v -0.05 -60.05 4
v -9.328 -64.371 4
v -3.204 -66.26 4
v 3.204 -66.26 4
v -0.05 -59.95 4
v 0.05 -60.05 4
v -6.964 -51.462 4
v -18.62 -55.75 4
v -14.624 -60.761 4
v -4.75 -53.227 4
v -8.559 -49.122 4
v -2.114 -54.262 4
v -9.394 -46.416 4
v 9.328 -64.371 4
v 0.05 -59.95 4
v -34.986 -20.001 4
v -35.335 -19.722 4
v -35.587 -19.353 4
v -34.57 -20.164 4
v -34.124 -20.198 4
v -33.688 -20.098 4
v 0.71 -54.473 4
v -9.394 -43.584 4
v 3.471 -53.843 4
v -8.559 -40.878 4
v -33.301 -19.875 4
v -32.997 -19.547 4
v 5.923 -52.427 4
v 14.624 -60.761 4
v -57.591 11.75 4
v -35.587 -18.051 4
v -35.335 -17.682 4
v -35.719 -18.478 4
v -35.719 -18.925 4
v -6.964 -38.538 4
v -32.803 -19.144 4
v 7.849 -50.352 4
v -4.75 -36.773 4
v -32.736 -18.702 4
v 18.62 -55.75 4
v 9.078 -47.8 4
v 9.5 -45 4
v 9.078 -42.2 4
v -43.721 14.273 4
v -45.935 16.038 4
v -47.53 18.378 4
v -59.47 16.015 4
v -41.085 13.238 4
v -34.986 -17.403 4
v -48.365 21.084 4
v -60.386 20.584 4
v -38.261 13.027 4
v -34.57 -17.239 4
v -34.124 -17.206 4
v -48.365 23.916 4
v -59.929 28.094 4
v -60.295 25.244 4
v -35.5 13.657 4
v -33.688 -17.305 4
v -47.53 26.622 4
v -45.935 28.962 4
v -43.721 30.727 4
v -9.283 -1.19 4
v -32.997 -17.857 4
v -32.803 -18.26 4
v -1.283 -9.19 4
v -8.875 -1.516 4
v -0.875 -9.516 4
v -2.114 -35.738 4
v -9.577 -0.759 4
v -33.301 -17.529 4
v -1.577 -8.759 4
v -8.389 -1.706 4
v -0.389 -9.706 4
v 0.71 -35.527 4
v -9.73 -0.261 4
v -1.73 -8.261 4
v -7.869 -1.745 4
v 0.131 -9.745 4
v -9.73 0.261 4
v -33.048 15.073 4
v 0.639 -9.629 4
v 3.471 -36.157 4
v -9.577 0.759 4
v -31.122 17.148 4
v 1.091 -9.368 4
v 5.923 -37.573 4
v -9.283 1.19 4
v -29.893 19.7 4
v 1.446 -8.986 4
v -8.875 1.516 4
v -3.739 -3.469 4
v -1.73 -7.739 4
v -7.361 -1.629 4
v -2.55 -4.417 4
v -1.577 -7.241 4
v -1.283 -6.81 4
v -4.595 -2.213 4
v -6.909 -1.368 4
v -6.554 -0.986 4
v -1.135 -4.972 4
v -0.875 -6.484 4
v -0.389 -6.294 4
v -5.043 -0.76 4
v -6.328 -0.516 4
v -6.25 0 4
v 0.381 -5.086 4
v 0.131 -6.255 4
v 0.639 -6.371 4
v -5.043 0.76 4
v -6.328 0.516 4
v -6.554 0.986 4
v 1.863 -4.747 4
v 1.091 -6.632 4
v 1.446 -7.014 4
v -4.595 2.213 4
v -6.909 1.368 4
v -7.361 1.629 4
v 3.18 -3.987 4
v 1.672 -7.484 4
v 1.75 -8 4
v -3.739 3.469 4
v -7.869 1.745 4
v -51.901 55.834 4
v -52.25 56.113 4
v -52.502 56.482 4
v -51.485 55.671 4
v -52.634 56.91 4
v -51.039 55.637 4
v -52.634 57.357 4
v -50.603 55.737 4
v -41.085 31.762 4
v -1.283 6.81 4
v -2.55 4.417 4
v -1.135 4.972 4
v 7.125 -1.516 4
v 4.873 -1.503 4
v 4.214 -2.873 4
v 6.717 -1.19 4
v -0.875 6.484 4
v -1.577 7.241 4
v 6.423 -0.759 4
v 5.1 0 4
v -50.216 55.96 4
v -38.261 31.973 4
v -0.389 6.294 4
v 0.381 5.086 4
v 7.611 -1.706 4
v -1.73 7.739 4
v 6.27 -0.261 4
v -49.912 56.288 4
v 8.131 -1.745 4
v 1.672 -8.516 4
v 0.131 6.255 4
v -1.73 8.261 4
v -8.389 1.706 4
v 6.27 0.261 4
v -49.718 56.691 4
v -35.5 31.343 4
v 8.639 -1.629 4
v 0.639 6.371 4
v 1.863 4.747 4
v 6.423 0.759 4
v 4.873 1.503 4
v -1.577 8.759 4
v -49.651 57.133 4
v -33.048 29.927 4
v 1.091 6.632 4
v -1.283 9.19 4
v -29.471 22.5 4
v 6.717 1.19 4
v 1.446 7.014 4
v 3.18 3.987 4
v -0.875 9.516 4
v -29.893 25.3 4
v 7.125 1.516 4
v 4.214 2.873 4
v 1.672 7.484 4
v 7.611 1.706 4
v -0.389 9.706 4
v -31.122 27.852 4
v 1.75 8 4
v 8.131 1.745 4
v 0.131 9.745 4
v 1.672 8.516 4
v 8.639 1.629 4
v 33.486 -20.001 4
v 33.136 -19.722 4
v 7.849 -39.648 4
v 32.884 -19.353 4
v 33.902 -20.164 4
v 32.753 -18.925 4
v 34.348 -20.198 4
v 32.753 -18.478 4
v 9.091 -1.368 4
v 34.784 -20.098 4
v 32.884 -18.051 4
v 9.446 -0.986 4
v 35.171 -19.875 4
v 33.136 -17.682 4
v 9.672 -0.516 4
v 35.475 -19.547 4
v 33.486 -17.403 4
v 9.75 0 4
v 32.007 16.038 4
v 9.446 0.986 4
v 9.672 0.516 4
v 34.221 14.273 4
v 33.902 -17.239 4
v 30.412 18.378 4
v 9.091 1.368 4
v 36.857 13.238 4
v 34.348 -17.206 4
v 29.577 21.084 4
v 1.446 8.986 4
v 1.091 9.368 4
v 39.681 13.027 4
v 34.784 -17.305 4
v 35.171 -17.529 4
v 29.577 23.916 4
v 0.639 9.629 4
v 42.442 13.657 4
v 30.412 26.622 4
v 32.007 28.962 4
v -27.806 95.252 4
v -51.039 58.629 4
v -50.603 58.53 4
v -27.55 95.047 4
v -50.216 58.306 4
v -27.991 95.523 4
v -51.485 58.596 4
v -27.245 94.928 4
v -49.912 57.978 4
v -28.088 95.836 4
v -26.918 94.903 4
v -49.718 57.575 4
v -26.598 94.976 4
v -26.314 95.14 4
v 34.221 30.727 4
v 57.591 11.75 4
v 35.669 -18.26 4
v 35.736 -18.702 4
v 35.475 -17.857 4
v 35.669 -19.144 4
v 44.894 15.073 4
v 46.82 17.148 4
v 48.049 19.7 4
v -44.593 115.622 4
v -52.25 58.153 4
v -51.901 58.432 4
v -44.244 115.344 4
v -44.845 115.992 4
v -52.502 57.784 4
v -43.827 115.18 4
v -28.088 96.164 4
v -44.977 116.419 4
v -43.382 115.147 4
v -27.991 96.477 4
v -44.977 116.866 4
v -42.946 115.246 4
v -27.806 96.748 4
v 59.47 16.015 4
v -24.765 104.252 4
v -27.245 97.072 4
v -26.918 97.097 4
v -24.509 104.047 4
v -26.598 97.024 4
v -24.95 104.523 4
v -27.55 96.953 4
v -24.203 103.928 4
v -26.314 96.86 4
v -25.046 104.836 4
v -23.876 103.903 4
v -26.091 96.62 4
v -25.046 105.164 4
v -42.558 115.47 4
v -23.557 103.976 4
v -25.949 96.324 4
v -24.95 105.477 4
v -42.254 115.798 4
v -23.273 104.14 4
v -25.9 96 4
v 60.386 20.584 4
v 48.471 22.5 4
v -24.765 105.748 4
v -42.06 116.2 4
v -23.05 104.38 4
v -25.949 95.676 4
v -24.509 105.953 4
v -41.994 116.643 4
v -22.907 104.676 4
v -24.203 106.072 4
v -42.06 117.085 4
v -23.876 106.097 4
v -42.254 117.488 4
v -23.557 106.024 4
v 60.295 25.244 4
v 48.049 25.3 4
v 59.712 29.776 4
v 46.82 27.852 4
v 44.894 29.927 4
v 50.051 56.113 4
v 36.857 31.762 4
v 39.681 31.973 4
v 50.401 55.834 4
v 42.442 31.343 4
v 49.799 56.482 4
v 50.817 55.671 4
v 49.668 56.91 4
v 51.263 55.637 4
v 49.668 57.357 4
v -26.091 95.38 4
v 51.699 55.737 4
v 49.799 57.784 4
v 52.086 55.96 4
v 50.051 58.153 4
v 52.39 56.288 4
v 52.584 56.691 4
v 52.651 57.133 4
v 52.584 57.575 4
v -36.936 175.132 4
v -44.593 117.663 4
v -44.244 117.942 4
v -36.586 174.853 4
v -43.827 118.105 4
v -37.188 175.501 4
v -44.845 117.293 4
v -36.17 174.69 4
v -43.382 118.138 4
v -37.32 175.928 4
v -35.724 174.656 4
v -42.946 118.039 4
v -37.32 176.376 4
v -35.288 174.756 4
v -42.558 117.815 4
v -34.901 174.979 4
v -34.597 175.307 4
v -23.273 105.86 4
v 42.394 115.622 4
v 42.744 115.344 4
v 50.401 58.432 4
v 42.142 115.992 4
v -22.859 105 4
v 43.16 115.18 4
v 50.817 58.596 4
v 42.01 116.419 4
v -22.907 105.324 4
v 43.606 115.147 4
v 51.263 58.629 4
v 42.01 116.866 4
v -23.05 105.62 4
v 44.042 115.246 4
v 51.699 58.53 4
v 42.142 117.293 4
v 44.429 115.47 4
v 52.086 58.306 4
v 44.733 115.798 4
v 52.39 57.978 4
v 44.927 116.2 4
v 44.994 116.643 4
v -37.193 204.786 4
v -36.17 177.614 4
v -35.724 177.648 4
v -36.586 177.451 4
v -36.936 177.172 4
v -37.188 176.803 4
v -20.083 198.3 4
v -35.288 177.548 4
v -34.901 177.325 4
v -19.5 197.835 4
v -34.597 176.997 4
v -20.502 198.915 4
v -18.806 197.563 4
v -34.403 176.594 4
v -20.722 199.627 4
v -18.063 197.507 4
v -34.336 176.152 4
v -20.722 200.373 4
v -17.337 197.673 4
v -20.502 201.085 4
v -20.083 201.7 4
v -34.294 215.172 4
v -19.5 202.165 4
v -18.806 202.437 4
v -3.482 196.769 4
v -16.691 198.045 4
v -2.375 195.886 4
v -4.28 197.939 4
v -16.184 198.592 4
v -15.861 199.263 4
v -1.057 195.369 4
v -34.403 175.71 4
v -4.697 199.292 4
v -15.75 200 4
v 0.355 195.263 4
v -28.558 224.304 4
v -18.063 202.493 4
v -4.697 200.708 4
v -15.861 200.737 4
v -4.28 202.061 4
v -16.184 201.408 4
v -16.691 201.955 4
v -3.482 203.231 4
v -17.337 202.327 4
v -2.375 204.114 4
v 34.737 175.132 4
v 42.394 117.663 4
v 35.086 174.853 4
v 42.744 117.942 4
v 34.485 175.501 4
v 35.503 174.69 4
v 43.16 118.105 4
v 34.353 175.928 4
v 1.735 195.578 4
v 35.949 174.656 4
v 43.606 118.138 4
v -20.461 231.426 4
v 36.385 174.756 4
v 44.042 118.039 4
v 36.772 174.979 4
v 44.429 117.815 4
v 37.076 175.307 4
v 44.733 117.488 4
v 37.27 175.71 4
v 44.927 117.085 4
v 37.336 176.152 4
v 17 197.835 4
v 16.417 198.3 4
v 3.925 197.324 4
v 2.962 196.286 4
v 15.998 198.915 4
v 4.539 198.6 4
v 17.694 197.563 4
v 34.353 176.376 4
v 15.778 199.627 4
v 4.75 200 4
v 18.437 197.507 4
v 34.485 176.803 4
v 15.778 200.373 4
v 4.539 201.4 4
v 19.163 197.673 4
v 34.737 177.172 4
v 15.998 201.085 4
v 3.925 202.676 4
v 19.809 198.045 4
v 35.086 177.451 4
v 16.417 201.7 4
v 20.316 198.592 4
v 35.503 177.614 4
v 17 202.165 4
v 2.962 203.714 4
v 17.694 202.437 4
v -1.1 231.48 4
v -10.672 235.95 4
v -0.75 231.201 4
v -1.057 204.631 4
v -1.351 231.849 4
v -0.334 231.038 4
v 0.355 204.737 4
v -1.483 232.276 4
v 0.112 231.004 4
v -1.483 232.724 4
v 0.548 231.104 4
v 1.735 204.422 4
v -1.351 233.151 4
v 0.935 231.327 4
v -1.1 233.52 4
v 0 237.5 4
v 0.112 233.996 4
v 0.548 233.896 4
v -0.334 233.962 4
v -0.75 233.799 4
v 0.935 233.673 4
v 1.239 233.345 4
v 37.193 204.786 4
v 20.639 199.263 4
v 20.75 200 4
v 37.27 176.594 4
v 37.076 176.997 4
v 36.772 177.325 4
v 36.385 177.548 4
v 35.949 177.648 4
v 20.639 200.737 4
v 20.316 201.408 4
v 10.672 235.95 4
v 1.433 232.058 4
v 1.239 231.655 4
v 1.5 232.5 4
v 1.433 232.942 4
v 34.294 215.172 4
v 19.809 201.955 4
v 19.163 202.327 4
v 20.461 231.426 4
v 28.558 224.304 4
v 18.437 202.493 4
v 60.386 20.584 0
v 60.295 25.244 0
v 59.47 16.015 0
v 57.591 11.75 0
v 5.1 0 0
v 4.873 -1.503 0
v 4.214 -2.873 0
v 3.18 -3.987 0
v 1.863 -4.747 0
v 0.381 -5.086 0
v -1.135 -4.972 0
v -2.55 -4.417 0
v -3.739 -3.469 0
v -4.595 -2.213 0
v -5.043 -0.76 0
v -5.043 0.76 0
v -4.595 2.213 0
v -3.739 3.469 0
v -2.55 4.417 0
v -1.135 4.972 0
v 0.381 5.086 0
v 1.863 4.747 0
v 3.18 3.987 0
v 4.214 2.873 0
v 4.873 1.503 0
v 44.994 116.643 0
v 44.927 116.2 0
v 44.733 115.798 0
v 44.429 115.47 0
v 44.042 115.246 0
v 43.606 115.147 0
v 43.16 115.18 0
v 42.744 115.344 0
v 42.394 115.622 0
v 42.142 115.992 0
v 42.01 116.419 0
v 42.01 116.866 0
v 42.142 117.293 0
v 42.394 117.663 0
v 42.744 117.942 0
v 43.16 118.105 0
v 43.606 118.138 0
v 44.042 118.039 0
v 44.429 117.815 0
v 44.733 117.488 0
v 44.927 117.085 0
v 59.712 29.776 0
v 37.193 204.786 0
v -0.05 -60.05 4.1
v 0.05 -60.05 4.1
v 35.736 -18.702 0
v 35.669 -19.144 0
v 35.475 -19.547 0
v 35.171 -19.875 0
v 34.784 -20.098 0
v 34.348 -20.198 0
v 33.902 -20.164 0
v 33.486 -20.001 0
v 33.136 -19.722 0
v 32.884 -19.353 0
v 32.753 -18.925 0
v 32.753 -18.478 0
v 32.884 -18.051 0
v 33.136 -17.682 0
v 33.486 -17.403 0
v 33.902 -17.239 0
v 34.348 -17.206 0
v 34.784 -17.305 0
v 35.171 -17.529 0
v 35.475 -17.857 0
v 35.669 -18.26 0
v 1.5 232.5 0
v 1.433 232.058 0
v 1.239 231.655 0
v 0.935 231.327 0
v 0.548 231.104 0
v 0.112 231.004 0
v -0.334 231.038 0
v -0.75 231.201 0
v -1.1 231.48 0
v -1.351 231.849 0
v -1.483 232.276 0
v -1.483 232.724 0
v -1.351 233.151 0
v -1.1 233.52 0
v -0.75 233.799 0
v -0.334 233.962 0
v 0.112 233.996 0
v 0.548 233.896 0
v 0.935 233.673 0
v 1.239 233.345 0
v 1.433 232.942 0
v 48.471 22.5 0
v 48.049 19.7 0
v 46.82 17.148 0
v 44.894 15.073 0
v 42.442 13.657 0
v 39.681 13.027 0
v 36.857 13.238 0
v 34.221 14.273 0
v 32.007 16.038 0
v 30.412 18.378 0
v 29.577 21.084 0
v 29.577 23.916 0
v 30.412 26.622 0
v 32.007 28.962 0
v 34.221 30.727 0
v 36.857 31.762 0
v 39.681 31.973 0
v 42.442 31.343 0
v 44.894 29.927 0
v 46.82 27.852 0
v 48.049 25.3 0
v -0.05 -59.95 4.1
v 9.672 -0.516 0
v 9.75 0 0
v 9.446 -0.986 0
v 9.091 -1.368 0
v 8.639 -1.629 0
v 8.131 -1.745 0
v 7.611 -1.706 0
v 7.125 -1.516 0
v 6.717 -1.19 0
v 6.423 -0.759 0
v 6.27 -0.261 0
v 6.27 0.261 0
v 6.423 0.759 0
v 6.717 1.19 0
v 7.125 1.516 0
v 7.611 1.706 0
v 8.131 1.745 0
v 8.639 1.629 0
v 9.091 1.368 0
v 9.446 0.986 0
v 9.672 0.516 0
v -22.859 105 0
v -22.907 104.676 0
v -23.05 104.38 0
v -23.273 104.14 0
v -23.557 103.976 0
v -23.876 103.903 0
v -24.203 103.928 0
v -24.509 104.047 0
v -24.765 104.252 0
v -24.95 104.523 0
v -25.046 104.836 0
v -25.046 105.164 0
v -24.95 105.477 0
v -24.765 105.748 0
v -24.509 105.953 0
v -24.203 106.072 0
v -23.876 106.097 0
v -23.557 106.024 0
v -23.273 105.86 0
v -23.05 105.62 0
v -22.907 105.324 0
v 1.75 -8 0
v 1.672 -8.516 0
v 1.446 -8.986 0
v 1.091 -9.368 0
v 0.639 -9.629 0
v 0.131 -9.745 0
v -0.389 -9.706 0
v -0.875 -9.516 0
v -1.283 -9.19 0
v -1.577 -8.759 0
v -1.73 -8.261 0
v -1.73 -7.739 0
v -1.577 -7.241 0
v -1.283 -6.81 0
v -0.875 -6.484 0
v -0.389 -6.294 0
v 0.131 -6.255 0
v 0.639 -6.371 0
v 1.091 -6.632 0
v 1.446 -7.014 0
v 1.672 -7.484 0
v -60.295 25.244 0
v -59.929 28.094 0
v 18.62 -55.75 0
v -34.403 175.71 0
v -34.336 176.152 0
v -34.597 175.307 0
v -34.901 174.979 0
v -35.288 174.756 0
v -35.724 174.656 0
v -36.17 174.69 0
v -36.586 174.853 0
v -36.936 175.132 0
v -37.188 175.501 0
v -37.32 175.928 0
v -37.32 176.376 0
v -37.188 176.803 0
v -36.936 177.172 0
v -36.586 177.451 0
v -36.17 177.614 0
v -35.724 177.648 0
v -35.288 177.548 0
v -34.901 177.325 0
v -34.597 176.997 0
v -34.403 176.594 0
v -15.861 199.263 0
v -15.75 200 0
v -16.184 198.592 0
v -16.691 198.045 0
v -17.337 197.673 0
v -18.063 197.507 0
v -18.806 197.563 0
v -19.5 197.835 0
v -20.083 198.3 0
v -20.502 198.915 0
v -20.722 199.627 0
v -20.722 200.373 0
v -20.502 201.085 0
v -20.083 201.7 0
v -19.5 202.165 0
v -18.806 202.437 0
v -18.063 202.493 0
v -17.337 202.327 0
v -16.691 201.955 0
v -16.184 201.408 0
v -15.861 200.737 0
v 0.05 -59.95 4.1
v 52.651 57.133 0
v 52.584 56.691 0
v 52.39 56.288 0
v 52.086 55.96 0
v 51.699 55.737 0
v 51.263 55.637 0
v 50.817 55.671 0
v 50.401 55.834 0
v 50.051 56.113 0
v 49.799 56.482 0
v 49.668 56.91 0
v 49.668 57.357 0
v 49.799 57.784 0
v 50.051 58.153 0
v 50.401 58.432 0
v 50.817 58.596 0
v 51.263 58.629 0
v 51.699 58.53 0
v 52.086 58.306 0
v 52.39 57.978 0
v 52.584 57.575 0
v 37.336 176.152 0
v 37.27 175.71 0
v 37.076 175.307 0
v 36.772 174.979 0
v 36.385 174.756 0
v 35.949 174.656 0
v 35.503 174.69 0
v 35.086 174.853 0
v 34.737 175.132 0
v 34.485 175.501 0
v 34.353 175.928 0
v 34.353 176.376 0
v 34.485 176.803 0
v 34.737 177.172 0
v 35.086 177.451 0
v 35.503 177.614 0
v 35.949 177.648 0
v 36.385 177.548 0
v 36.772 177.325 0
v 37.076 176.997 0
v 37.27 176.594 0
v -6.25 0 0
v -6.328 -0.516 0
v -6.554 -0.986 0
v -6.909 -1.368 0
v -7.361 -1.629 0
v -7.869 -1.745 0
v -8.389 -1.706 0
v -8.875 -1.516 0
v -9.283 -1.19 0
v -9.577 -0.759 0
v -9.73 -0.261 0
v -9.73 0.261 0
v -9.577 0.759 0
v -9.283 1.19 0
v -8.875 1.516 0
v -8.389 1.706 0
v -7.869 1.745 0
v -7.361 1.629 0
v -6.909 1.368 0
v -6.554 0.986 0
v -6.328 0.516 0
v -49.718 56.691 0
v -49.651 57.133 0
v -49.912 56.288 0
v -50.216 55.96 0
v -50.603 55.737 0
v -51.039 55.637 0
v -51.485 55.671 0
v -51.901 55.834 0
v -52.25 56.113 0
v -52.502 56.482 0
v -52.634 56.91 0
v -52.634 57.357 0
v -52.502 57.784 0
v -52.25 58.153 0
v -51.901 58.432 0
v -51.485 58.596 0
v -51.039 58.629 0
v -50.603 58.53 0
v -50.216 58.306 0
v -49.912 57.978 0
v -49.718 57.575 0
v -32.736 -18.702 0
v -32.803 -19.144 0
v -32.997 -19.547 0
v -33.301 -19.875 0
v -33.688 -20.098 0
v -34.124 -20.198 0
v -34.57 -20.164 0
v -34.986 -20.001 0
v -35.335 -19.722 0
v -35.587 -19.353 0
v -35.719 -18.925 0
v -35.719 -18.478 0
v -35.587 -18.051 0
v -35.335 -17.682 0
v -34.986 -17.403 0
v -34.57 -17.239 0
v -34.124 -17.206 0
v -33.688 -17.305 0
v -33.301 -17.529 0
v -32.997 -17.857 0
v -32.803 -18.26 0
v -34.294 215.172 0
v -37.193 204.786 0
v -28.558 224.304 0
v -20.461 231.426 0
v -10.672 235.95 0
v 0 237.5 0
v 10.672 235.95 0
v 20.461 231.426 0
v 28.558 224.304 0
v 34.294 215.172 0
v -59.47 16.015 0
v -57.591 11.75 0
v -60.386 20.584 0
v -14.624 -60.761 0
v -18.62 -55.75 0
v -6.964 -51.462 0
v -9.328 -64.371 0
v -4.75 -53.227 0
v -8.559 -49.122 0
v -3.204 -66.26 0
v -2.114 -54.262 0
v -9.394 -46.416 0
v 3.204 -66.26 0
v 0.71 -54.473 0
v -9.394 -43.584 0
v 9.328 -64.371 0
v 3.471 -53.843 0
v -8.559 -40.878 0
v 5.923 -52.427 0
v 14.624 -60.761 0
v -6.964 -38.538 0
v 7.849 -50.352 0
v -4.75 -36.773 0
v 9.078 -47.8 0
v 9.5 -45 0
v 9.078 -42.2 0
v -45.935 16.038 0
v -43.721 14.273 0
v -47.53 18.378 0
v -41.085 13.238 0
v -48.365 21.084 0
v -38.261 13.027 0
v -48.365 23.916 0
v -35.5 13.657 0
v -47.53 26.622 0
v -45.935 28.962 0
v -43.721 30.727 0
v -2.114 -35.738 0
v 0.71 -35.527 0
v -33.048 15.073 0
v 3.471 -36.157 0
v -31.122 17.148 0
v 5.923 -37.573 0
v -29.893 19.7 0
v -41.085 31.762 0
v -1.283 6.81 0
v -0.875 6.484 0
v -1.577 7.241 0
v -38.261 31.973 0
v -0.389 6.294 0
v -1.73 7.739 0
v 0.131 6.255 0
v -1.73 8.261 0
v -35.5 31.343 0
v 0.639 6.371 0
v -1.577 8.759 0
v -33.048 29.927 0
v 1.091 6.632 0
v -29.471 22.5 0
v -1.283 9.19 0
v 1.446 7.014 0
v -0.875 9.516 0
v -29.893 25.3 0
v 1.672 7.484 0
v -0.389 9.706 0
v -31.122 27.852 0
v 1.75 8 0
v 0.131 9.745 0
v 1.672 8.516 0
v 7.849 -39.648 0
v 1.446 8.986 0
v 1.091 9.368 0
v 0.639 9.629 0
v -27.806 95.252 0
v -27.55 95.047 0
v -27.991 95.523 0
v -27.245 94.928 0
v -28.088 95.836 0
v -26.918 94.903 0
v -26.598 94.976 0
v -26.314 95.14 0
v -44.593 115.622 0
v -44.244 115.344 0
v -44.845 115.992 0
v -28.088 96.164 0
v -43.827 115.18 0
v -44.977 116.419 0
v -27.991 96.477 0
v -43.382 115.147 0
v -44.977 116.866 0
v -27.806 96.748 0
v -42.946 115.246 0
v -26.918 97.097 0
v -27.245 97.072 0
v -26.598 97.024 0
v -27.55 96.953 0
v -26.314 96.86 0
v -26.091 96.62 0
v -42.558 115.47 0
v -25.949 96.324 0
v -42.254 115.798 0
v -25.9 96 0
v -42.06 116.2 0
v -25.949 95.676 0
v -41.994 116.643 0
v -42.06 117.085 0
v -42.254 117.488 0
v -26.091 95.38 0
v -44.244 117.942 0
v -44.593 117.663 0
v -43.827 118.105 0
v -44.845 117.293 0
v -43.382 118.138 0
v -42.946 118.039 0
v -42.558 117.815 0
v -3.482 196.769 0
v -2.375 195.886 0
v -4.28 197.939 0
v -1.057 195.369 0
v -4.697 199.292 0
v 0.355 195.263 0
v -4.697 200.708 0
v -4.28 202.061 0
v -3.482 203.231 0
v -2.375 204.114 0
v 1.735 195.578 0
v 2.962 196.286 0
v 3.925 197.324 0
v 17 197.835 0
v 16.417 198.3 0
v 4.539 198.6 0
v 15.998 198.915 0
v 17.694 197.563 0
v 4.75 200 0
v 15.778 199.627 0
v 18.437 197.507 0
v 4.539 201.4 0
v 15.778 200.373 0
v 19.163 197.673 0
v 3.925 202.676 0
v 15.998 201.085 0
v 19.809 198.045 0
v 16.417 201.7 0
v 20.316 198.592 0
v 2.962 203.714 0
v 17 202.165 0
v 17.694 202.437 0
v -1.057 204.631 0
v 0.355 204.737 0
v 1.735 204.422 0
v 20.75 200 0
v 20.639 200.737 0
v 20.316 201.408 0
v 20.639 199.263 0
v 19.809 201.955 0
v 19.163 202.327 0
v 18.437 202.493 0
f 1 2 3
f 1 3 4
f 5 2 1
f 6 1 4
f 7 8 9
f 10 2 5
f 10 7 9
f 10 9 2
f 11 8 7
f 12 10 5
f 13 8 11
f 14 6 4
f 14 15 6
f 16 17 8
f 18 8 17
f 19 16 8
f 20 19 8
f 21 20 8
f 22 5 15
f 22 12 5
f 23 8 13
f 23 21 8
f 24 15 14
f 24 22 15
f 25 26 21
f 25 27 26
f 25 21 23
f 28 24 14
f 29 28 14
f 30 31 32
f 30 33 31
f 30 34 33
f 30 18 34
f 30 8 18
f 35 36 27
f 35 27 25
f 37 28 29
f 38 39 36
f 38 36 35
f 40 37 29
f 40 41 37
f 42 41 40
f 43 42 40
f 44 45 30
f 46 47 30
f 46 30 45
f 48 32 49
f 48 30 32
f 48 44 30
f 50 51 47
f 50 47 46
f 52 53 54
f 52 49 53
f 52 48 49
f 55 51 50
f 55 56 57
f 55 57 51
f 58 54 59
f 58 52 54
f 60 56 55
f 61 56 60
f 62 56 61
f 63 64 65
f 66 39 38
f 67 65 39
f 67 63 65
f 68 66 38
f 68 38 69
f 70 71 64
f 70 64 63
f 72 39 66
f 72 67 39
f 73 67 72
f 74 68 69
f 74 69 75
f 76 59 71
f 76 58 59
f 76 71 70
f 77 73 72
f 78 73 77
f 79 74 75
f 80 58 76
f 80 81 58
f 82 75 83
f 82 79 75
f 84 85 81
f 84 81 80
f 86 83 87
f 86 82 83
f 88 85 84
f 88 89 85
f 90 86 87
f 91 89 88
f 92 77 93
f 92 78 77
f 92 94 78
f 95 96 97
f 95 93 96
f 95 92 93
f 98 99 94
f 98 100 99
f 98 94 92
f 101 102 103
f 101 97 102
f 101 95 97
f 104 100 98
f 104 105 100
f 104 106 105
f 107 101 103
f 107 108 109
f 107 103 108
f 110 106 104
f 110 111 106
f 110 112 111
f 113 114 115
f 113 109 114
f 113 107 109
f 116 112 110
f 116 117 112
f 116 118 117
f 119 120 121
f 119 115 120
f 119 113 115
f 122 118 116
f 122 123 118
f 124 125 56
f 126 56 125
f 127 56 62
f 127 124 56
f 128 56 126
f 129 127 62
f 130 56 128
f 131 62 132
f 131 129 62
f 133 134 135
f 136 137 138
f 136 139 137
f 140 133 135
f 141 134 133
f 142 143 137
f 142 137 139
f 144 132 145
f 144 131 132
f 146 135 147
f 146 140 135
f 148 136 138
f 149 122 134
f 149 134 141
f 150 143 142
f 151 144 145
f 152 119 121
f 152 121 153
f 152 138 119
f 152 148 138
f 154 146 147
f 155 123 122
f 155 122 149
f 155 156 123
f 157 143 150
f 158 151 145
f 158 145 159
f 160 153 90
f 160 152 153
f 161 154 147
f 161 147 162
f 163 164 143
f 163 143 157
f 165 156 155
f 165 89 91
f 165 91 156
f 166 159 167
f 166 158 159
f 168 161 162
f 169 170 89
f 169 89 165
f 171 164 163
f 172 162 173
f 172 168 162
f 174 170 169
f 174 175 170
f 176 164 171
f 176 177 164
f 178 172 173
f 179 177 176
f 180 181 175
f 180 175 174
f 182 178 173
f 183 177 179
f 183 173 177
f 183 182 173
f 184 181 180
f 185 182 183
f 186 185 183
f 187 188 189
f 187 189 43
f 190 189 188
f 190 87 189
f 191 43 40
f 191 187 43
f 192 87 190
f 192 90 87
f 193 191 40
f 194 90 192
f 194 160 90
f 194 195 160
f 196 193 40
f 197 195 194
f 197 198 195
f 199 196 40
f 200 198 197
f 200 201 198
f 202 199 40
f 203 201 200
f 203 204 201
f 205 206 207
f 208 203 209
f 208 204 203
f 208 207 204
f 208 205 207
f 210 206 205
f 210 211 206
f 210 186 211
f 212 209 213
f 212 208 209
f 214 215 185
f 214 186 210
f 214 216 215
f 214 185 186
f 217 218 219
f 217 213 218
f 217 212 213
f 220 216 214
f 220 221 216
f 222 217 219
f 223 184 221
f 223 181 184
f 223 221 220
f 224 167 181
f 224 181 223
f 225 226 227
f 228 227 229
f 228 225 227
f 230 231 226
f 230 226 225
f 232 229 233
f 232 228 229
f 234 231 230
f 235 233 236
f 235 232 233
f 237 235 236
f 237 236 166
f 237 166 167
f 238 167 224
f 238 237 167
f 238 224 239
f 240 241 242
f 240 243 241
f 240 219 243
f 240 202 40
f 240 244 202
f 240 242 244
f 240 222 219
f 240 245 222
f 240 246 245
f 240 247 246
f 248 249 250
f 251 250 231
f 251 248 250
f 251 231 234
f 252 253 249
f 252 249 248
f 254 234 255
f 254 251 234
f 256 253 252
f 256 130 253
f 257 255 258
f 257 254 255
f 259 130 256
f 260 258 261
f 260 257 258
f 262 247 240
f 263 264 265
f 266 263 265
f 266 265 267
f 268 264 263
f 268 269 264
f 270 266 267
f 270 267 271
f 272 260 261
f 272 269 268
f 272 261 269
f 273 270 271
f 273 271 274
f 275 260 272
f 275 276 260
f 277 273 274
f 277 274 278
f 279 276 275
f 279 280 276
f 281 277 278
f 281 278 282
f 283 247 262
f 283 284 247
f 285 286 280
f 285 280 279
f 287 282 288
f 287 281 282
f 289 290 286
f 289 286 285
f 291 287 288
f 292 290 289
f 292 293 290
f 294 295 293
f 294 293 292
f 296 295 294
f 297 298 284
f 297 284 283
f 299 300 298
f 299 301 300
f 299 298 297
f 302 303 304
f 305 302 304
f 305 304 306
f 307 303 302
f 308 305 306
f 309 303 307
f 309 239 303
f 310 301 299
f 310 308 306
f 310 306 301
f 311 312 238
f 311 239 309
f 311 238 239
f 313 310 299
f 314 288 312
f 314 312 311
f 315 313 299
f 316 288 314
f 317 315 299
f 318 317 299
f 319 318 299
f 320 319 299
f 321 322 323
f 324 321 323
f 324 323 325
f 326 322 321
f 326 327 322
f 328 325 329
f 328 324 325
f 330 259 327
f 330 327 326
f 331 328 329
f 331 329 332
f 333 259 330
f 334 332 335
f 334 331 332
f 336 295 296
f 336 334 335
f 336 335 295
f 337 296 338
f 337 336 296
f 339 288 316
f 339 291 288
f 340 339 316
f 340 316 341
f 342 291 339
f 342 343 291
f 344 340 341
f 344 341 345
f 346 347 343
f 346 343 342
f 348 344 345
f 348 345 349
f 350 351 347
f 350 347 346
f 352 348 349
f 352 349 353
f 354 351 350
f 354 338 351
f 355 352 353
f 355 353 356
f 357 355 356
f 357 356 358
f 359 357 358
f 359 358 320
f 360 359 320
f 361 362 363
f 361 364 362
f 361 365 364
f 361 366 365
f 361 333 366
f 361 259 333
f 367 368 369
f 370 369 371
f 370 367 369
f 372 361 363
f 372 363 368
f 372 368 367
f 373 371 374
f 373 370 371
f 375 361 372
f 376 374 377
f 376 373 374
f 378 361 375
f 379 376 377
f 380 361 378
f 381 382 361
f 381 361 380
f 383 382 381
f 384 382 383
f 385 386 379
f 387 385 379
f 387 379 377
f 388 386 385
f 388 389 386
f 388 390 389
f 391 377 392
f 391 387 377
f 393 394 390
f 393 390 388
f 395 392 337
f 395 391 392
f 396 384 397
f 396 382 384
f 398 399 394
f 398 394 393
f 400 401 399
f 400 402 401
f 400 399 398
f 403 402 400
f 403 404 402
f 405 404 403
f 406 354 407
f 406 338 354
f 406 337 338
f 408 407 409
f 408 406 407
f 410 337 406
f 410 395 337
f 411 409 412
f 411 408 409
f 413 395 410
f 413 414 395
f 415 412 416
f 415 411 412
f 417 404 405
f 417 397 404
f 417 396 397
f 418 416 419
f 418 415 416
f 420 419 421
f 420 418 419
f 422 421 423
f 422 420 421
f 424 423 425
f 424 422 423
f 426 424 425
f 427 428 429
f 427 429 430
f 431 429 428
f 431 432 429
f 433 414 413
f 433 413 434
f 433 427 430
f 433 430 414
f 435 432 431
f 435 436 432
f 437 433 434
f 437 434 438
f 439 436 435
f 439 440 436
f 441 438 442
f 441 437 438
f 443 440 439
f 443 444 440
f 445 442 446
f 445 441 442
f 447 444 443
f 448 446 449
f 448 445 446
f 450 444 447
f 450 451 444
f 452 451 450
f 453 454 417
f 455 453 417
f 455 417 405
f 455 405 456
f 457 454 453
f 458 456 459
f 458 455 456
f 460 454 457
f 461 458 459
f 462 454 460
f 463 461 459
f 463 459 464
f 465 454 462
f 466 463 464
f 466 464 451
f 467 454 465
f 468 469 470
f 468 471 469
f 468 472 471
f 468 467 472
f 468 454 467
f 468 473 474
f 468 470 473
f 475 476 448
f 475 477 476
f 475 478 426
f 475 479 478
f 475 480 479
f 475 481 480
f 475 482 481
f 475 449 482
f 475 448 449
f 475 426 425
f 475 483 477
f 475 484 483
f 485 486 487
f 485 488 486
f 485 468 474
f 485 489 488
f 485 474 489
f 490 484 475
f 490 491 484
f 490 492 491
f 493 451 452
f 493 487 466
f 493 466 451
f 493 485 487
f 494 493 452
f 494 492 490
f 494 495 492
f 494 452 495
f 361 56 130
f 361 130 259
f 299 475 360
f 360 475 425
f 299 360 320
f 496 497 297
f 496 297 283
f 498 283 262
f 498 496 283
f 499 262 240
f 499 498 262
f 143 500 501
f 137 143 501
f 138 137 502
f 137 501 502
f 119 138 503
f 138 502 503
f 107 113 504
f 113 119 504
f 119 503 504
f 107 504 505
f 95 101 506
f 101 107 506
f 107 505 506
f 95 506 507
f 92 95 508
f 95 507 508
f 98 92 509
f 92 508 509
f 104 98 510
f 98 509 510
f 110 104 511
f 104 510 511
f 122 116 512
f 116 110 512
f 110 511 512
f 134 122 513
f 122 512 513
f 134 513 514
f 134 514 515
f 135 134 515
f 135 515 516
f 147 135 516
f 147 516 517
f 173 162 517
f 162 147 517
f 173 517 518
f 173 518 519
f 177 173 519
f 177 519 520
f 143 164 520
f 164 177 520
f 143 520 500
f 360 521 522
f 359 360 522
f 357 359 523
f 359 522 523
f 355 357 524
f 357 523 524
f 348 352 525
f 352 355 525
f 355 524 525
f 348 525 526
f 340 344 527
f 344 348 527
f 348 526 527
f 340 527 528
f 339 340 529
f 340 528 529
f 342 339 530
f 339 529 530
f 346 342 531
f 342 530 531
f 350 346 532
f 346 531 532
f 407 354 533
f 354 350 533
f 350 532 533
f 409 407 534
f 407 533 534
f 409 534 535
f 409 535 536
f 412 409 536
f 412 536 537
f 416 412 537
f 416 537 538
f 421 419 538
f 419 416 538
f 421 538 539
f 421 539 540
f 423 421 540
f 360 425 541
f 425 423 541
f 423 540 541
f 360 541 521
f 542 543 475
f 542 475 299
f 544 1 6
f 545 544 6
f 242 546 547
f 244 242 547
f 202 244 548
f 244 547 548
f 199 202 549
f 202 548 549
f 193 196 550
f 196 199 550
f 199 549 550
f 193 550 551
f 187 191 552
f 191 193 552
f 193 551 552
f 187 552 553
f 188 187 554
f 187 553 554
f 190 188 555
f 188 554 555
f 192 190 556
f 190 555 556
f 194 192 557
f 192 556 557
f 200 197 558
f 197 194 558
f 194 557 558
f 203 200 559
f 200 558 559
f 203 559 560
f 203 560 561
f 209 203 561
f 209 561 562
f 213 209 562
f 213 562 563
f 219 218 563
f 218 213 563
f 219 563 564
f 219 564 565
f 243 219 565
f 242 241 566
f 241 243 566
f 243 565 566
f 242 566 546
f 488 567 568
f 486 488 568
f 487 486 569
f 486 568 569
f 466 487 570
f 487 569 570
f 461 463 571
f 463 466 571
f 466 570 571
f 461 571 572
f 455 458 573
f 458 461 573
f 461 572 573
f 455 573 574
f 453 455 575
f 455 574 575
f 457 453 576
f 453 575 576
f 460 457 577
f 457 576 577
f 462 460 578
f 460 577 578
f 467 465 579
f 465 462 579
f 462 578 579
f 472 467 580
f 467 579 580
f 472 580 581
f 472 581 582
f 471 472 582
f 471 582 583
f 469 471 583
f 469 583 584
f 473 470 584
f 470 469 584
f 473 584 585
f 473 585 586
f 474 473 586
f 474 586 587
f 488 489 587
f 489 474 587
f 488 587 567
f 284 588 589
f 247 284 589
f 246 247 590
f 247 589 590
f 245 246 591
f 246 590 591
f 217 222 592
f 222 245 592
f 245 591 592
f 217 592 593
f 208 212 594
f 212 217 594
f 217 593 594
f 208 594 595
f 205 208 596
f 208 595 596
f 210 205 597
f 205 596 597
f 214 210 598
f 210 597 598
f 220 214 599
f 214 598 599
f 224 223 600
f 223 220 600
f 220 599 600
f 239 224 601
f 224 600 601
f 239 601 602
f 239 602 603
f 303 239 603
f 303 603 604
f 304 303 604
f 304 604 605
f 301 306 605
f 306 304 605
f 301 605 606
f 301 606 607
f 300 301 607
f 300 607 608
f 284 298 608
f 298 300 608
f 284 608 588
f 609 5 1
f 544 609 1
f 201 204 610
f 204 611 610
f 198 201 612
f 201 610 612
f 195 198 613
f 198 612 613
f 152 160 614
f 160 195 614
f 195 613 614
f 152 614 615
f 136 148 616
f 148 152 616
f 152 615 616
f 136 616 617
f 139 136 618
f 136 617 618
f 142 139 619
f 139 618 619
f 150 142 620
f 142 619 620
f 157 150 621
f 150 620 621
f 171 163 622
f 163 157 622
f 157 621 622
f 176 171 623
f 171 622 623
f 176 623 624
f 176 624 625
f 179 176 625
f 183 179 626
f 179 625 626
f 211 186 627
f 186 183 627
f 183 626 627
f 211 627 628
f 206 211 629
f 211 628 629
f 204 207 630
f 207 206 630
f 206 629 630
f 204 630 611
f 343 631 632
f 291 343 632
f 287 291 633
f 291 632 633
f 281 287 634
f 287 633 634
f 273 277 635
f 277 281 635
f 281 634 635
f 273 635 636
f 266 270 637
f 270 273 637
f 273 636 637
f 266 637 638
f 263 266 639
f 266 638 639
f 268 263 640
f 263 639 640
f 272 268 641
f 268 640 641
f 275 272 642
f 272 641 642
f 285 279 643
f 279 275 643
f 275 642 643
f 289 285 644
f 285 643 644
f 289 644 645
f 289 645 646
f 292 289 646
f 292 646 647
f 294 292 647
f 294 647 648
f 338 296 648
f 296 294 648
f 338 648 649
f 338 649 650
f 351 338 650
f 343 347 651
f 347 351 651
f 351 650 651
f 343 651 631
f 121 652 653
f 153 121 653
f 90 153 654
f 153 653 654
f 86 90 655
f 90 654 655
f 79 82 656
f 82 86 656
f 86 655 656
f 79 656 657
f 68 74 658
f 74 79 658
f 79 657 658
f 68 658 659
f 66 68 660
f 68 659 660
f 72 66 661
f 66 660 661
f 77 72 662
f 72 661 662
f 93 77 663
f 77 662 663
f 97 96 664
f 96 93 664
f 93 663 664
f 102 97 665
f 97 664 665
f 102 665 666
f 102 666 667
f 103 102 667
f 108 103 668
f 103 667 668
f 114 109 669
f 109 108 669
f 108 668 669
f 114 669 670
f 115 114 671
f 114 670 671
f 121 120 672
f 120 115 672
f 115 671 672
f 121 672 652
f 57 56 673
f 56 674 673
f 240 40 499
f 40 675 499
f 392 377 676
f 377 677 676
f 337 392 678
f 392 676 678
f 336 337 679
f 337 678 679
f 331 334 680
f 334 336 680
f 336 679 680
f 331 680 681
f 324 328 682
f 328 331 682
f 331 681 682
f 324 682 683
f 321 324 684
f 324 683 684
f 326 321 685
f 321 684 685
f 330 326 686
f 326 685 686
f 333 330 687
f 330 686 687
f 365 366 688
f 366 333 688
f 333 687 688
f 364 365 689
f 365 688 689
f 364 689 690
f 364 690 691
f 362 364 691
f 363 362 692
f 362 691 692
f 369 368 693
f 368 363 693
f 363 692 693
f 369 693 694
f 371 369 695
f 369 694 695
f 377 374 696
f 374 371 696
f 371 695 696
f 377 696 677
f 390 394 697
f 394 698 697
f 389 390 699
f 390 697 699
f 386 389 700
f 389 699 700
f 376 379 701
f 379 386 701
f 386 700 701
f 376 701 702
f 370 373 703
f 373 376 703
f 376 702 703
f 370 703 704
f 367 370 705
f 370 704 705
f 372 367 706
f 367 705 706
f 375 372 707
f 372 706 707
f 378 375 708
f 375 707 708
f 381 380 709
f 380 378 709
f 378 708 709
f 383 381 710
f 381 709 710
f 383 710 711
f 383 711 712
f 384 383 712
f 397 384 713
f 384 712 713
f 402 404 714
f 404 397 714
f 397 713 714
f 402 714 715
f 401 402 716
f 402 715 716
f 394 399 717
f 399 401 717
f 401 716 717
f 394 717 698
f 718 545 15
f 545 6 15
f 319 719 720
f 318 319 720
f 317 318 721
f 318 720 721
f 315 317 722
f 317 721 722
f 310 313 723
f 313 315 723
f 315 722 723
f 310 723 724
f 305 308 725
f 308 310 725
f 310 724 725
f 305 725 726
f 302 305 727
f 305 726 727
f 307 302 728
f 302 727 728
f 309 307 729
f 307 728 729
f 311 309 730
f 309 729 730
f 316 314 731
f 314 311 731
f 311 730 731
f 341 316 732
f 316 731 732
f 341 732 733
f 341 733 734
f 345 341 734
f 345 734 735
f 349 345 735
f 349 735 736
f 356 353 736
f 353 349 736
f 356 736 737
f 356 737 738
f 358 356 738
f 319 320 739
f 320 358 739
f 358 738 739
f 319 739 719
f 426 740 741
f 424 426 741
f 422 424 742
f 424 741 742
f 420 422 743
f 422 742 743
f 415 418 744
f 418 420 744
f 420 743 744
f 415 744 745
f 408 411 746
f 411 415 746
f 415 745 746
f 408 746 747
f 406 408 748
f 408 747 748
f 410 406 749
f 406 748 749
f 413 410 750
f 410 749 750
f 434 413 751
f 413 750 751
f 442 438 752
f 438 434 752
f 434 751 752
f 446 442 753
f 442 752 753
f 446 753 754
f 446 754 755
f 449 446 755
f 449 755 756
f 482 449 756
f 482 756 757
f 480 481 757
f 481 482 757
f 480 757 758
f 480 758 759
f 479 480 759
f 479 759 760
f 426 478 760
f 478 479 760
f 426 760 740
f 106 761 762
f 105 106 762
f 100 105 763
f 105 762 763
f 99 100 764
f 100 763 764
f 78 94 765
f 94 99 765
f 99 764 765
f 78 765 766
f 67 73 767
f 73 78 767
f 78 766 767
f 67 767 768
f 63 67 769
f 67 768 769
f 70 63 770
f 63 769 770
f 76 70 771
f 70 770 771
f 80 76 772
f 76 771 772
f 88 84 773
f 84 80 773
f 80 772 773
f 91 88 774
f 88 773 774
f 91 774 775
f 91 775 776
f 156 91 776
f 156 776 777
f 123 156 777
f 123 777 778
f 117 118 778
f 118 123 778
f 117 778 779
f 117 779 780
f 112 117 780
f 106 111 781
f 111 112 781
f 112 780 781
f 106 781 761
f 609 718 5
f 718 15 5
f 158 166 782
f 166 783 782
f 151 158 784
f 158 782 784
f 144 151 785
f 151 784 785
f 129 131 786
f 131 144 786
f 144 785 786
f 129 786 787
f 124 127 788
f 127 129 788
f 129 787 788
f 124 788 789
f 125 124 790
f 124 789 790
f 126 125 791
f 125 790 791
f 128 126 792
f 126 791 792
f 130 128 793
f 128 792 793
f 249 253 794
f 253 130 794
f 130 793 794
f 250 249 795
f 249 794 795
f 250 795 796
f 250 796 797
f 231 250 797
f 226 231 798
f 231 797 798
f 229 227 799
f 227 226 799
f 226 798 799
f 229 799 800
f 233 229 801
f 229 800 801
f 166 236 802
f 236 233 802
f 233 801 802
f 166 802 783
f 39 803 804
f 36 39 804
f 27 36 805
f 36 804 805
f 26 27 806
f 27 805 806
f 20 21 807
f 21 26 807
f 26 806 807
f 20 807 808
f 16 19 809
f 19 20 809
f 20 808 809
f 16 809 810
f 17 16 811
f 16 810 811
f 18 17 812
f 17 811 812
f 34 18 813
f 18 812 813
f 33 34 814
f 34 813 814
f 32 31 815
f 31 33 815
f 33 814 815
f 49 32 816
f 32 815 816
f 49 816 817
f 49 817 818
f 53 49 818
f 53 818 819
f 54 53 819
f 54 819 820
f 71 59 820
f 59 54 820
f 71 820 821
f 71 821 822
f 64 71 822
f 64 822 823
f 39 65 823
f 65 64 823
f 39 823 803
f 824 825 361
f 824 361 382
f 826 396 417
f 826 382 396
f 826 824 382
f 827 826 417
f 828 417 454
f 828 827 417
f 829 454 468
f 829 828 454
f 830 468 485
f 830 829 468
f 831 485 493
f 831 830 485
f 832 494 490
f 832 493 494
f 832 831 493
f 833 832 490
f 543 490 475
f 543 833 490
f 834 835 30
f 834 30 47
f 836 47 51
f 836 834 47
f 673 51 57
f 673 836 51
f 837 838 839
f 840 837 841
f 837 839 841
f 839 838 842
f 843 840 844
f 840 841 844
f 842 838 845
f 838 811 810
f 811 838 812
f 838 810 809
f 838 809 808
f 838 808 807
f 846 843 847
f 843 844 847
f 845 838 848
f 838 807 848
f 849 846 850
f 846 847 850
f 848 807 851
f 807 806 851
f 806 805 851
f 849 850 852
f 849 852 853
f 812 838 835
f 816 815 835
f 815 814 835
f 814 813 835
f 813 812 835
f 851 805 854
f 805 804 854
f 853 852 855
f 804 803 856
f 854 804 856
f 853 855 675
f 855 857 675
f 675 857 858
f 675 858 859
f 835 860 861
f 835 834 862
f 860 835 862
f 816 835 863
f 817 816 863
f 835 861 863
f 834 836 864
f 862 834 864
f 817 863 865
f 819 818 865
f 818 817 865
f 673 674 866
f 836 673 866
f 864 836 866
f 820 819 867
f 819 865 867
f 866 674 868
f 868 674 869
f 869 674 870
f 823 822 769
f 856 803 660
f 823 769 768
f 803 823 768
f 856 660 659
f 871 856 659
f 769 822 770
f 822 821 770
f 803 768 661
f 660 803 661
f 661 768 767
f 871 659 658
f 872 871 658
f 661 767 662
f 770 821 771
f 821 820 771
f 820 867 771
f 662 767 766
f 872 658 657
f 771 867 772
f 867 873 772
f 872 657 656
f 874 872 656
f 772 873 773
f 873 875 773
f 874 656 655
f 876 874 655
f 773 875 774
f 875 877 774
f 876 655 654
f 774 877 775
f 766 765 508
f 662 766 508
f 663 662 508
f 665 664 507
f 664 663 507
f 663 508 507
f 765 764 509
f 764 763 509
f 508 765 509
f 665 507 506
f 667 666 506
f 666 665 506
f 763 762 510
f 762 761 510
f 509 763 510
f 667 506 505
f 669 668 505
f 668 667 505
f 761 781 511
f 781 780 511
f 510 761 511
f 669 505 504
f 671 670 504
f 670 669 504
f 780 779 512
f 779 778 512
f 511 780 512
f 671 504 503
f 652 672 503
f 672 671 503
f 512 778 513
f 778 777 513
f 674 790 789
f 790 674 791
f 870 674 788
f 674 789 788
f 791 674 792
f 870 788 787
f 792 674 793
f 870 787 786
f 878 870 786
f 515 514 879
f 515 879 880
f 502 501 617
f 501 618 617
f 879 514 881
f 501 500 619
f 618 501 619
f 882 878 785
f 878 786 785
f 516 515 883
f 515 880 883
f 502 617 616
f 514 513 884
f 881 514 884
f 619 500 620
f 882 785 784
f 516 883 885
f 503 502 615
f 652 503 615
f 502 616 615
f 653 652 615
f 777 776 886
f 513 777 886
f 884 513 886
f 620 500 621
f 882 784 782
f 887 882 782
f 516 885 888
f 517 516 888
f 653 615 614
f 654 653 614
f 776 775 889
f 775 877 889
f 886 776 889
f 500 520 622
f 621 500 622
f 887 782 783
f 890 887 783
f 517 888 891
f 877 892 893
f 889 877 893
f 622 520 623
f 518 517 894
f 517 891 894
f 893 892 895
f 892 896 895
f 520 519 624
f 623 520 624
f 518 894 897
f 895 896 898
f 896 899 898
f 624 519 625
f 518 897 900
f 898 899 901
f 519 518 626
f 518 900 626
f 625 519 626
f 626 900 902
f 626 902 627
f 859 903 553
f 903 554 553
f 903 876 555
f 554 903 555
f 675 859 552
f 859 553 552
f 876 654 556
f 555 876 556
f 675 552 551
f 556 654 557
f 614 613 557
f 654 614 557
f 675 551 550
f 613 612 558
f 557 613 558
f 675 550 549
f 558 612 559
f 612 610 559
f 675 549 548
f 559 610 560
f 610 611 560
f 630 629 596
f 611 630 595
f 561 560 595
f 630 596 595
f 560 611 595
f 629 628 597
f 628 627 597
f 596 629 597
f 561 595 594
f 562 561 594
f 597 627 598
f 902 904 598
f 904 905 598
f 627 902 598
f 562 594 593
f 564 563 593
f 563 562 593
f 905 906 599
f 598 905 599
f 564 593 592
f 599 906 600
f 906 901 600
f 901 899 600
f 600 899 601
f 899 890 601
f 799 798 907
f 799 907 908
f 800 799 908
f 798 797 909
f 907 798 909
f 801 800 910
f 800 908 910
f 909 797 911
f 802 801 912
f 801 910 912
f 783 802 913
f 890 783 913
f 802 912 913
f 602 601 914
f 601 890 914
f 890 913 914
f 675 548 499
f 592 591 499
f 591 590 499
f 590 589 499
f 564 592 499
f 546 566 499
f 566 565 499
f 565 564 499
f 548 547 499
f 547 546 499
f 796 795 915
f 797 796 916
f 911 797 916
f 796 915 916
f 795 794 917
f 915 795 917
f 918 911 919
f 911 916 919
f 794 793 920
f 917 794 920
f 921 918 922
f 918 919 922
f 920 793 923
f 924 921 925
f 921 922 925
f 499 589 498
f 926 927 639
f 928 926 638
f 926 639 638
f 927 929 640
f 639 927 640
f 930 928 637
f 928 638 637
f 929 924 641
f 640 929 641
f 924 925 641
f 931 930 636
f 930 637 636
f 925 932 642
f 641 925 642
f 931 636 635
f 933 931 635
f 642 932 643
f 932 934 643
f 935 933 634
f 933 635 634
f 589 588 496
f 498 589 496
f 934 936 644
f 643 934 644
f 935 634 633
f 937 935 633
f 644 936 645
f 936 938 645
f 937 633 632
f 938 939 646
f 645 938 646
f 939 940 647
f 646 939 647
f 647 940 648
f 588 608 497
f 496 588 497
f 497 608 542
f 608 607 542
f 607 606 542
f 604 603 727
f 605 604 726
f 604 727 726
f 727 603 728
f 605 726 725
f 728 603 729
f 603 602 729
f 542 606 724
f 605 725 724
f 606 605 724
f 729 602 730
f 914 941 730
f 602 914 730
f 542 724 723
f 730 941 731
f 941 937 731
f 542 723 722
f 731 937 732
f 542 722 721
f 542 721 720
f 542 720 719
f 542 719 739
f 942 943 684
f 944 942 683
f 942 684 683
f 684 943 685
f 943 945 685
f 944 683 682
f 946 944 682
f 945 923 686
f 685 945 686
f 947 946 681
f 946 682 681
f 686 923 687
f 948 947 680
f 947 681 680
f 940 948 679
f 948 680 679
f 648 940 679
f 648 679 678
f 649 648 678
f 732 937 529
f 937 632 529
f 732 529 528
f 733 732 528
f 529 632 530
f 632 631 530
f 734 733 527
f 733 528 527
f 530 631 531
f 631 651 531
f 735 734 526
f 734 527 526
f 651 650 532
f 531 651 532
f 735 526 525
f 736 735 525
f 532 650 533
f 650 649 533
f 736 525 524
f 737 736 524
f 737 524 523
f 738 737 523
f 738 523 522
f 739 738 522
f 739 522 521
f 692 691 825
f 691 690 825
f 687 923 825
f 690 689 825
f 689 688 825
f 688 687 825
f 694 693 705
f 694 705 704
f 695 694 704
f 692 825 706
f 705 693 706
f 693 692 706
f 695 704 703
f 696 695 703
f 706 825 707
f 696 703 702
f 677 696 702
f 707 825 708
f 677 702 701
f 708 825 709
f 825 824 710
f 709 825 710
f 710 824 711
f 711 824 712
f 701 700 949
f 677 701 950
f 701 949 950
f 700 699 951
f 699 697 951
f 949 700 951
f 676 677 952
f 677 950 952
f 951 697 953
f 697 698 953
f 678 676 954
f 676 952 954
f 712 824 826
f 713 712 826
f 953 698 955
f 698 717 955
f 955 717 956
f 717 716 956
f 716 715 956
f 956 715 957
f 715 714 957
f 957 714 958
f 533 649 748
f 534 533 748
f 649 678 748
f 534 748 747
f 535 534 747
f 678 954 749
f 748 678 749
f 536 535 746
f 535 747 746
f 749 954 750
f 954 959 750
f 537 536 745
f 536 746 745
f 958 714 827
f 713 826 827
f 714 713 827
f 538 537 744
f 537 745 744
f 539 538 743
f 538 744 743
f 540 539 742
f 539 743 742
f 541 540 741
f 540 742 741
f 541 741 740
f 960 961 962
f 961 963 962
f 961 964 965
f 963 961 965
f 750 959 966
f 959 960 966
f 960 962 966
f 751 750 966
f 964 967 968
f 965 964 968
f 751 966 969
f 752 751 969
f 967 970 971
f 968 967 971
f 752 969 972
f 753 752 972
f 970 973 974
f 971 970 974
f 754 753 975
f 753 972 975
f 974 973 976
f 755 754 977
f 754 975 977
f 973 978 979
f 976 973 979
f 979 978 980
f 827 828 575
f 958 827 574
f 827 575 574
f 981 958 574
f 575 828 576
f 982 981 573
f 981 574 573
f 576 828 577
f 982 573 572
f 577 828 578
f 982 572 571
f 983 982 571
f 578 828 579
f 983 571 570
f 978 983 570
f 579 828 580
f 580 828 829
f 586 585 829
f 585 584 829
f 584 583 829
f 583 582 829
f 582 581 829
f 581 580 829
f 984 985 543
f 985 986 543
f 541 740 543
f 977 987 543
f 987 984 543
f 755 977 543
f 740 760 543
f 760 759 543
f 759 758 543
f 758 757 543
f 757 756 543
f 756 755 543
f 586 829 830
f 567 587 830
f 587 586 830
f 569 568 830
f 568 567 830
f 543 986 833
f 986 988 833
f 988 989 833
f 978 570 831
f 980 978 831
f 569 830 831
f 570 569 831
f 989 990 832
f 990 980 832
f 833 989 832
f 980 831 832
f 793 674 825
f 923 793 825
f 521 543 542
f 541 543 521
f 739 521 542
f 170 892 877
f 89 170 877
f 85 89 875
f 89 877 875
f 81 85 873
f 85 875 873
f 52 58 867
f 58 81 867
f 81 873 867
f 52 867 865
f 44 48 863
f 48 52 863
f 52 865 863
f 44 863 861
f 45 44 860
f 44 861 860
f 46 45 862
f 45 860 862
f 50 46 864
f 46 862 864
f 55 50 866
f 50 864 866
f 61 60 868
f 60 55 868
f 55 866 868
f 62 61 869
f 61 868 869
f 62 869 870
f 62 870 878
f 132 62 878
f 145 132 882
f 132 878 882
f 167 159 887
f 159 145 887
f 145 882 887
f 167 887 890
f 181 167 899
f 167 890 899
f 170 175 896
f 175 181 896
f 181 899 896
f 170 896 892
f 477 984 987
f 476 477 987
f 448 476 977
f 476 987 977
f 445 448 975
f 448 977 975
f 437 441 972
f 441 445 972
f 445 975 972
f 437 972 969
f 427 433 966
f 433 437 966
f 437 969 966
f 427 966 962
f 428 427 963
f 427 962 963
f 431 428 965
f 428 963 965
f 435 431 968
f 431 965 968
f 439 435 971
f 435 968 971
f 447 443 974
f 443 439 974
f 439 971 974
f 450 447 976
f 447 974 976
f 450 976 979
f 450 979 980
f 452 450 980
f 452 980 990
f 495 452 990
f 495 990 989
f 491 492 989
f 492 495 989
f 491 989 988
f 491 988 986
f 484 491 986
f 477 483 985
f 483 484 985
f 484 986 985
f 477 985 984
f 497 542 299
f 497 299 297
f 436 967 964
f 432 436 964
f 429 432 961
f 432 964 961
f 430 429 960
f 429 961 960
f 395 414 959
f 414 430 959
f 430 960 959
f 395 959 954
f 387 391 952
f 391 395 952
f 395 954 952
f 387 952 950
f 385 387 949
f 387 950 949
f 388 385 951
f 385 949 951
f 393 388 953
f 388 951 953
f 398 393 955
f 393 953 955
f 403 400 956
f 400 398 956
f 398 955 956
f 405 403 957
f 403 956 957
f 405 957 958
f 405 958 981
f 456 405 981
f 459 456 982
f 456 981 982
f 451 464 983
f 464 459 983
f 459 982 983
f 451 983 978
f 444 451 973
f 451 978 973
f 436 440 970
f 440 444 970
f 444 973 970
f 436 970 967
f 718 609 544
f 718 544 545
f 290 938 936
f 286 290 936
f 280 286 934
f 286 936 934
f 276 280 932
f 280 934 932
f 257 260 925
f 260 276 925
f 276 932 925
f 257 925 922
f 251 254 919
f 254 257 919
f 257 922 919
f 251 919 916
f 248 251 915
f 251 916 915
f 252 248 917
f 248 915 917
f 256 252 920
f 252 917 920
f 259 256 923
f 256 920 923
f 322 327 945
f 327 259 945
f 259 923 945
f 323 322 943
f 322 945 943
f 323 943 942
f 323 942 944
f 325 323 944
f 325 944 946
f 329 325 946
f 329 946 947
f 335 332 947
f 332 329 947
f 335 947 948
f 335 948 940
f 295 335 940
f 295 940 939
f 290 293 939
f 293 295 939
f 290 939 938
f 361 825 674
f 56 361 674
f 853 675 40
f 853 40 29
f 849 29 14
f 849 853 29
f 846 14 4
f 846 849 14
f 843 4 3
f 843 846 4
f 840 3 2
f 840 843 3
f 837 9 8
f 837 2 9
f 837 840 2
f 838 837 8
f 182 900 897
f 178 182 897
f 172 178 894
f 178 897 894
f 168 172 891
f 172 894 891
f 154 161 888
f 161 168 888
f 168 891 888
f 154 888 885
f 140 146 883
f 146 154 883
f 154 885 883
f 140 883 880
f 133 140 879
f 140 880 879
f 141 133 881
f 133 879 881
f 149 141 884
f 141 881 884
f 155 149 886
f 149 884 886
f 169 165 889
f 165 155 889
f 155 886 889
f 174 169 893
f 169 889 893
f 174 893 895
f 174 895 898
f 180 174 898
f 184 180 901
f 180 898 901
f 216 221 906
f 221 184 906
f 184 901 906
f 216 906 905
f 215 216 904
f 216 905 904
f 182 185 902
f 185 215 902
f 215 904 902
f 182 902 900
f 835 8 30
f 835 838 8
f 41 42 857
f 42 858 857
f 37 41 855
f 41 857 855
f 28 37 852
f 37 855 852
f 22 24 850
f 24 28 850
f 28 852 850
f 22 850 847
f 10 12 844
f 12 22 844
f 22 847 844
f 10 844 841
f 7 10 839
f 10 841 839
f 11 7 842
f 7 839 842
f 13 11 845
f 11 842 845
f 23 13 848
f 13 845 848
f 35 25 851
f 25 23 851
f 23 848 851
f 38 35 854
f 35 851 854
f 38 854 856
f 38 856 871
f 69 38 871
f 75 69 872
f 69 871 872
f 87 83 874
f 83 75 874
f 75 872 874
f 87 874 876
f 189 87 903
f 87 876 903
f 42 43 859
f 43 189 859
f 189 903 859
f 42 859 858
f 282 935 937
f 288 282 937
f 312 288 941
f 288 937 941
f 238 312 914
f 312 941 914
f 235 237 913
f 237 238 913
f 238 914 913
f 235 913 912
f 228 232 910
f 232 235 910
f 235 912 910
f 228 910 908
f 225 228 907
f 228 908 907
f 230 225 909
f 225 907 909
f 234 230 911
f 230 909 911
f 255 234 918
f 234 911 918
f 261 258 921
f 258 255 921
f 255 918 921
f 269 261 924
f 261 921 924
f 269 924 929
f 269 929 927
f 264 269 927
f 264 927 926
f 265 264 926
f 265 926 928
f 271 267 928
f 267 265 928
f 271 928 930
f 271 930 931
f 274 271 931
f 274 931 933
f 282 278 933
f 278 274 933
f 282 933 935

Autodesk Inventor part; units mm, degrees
ref_plane "YZ Plane" through (0, 0, 0) normal (1, 0, 0) x (0, 1, 0)
ref_plane "XZ Plane" through (0, 0, 0) normal (0, 1, 0) x (-1, 0, 0)
ref_plane "XY Plane" through (0, 0, 0) normal (0, 0, 1) x (1, 0, 0)
sketch "Sketch1" plane through (0, 0, 0) normal (0, 0, 1) x (1, 0, 0)
  line L0 (0, 0) -> (0, 200) construction
  arc A0 (37.1934, 204.7857) -> (-37.1934, 204.7857) centre (0, 200) ccw
  line L1 (0, 200) -> (-18.25, 200) construction
  circle A1 centre (-18.25, 200) radius 2.5
  line L2 (0, 200) -> (18.25, 200) construction
  circle A2 centre (18.25, 200) radius 2.5
  circle A3 centre (0, 0) radius 15 construction
  line L3 (37.1934, 204.7857) -> (59.7122, 29.7756)
  line L4 (-37.1934, 204.7857) -> (-59.9286, 28.0941)
  line L5 (48.4528, 117.2807) -> (43.4937, 116.6426) construction
  line L6 (51.1509, 57.1332) -> (35.8365, 176.152) construction
  circle A4 centre (35.8365, 176.152) radius 1.5
  circle A5 centre (51.1509, 57.1332) radius 1.5
  circle A6 centre (43.4937, 116.6426) radius 1.5
  line L7 (0, 237.5) -> (0, 232.5) construction
  circle A7 centre (0, 232.5) radius 1.5
  circle A8 centre (-35.8365, 176.152) radius 1.5
  circle A9 centre (-43.4937, 116.6426) radius 1.5
  circle A10 centre (-51.1509, 57.1332) radius 1.5
  circle A11 centre (0, 200) radius 4.75
  circle A12 centre (0, 0) radius 45 construction
  circle A13 centre (0, -45) radius 9.5
  circle A14 centre (0, -45) radius 14.5 construction
  circle A15 centre (0, -59.5) radius 2.25 construction
  circle A16 centre (14.5, -45) radius 2.25 construction
  circle A17 centre (0, -30.5) radius 2.25 construction
  circle A18 centre (-14.5, -45) radius 2.25 construction
  circle A19 centre (0, -45) radius 21.5 construction
  circle A20 centre (38.9711, 22.5) radius 21.5 construction
  circle A21 centre (51.5285, 29.75) radius 2.25 construction
  circle A22 centre (46.2211, 9.9426) radius 2.25 construction
  circle A23 centre (31.7211, 35.0574) radius 2.25 construction
  circle A24 centre (26.4138, 15.25) radius 2.25 construction
  circle A25 centre (38.9711, 22.5) radius 9.5
  circle A26 centre (-38.9711, 22.5) radius 21.5 construction
  circle A27 centre (-51.5285, 29.75) radius 2.25 construction
  circle A28 centre (-31.7211, 35.0574) radius 2.25 construction
  circle A29 centre (-46.2211, 9.9426) radius 2.25 construction
  circle A30 centre (-26.4138, 15.25) radius 2.25 construction
  circle A31 centre (-38.9711, 22.5) radius 9.5
  line L8 (-18.6195, -55.75) -> (-57.5907, 11.75)
  line L9 (18.6195, -55.75) -> (57.5907, 11.75)
  line L10 (48.4528, 117.2807) -> (48.4528, 23.0901) construction
  line L11 (59.7122, 29.7756) -> (60.2953, 25.2438)
  line L12 (48.4528, 23.0901) -> (48.4528, -26.9099) construction
  line L13 (48.4528, -26.9099) -> (38.566, -21.2018) construction
  line L14 (38.566, -21.2018) -> (34.2359, -18.7018) construction
  circle A32 centre (34.2359, -18.7018) radius 1.5
  circle A33 centre (-34.2359, -18.7018) radius 1.5
  arc A34 (57.5907, 11.75) -> (60.2953, 25.2438) centre (38.9711, 22.5) ccw
  arc A35 (-60.2953, 25.2438) -> (-57.5907, 11.75) centre (-38.9711, 22.5) ccw
  arc A36 (-18.6195, -55.75) -> (18.6195, -55.75) centre (0, -45) ccw
  line L15 (38.9711, 22.5) -> (53.4711, 22.5) construction
  line L16 (-59.9286, 28.0941) -> (-60.2953, 25.2438)
  circle A37 centre (0, 0) radius 5.1
  line L17 (0, 0) -> (0, -8) construction
  circle A38 centre (0, -8) radius 1.75
  circle A39 centre (8, 0) radius 1.75
  circle A40 centre (0, 8) radius 1.75
  circle A41 centre (-8, 0) radius 1.75
  line L18 (0, 200) -> (0, 135) construction
  circle A42 centre (-27, 96) radius 1.1
  circle A43 centre (-23.9586, 105) radius 1.1
  dimension "d84" = 90
  dimension "d86" = 29
  dimension "d58" = 200
  dimension "d59" = 75
  dimension "d60" = 18.25
  dimension "d61" = 5
  dimension "d62" = 30
  dimension "d63" = 5
  dimension "d64" = 120
  dimension "d65" = 3
  dimension "d66" = 3
  dimension "d67" = 3
  dimension "d68" = 5
  dimension "d69" = 3
  dimension "d70" = 9.5
  dimension "d85" = 19
  dimension "d87" = 4.5
  dimension "d88" = 45
  dimension "d89" = 14.5
  dimension "d90" = 14.5
  dimension "d91" = 360
  dimension "d92" = 43
  dimension "d93" = 360
  dimension "d94" = 94.1906
  dimension "d95" = 50
  dimension "d96" = 5
  dimension "d97" = 3
  dimension "d103" = 10.2
  dimension "d104" = 8
  dimension "d105" = 3.5
  dimension "d108" = 360
  dimension "d110" = 65
  dimension "d113" = 2.2
  dimension "d115" = 2.2
  dimension "d116" = 27
  dimension "d118" = 9.5
  dimension "d119" = 95
  dimension "d120" = 104
extrude "Extrusion1" add sketch "Sketch1" along normal blind 4
sketch "Sketch2" plane through (0, 0, 4) normal (0, 0, 1) x (1, 0, 0)
  line L0 (0, 0) -> (0, -60) construction
  line L1 (0.05, -59.95) -> (-0.05, -59.95)
  line L2 (-0.05, -59.95) -> (-0.05, -60.05)
  line L3 (-0.05, -60.05) -> (0.05, -60.05)
  line L4 (0.05, -60.05) -> (0.05, -59.95)
  line L5 (0.05, -59.95) -> (-0.05, -60.05) construction
  line L6 (-0.05, -59.95) -> (0.05, -60.05) construction
  dimension "d47" = 60
  dimension "d48" = 0.1
  dimension "d49" = 0.1
extrude "Extrusion2" add sketch "Sketch2" along normal blind 0.1
equation "\"d63\" = d101"
equation "\"d65\" = d102"
equation "\"d66\" = d102"
equation "\"d67\" = d102"
equation "\"d68\" = d101"
equation "\"d69\" = d102"
equation "\"d96\" = d101"
equation "\"d97\" = d102"
equation "\"d101\" = 5"
equation "\"d102\" = 3"
properties part number "2ELO"
